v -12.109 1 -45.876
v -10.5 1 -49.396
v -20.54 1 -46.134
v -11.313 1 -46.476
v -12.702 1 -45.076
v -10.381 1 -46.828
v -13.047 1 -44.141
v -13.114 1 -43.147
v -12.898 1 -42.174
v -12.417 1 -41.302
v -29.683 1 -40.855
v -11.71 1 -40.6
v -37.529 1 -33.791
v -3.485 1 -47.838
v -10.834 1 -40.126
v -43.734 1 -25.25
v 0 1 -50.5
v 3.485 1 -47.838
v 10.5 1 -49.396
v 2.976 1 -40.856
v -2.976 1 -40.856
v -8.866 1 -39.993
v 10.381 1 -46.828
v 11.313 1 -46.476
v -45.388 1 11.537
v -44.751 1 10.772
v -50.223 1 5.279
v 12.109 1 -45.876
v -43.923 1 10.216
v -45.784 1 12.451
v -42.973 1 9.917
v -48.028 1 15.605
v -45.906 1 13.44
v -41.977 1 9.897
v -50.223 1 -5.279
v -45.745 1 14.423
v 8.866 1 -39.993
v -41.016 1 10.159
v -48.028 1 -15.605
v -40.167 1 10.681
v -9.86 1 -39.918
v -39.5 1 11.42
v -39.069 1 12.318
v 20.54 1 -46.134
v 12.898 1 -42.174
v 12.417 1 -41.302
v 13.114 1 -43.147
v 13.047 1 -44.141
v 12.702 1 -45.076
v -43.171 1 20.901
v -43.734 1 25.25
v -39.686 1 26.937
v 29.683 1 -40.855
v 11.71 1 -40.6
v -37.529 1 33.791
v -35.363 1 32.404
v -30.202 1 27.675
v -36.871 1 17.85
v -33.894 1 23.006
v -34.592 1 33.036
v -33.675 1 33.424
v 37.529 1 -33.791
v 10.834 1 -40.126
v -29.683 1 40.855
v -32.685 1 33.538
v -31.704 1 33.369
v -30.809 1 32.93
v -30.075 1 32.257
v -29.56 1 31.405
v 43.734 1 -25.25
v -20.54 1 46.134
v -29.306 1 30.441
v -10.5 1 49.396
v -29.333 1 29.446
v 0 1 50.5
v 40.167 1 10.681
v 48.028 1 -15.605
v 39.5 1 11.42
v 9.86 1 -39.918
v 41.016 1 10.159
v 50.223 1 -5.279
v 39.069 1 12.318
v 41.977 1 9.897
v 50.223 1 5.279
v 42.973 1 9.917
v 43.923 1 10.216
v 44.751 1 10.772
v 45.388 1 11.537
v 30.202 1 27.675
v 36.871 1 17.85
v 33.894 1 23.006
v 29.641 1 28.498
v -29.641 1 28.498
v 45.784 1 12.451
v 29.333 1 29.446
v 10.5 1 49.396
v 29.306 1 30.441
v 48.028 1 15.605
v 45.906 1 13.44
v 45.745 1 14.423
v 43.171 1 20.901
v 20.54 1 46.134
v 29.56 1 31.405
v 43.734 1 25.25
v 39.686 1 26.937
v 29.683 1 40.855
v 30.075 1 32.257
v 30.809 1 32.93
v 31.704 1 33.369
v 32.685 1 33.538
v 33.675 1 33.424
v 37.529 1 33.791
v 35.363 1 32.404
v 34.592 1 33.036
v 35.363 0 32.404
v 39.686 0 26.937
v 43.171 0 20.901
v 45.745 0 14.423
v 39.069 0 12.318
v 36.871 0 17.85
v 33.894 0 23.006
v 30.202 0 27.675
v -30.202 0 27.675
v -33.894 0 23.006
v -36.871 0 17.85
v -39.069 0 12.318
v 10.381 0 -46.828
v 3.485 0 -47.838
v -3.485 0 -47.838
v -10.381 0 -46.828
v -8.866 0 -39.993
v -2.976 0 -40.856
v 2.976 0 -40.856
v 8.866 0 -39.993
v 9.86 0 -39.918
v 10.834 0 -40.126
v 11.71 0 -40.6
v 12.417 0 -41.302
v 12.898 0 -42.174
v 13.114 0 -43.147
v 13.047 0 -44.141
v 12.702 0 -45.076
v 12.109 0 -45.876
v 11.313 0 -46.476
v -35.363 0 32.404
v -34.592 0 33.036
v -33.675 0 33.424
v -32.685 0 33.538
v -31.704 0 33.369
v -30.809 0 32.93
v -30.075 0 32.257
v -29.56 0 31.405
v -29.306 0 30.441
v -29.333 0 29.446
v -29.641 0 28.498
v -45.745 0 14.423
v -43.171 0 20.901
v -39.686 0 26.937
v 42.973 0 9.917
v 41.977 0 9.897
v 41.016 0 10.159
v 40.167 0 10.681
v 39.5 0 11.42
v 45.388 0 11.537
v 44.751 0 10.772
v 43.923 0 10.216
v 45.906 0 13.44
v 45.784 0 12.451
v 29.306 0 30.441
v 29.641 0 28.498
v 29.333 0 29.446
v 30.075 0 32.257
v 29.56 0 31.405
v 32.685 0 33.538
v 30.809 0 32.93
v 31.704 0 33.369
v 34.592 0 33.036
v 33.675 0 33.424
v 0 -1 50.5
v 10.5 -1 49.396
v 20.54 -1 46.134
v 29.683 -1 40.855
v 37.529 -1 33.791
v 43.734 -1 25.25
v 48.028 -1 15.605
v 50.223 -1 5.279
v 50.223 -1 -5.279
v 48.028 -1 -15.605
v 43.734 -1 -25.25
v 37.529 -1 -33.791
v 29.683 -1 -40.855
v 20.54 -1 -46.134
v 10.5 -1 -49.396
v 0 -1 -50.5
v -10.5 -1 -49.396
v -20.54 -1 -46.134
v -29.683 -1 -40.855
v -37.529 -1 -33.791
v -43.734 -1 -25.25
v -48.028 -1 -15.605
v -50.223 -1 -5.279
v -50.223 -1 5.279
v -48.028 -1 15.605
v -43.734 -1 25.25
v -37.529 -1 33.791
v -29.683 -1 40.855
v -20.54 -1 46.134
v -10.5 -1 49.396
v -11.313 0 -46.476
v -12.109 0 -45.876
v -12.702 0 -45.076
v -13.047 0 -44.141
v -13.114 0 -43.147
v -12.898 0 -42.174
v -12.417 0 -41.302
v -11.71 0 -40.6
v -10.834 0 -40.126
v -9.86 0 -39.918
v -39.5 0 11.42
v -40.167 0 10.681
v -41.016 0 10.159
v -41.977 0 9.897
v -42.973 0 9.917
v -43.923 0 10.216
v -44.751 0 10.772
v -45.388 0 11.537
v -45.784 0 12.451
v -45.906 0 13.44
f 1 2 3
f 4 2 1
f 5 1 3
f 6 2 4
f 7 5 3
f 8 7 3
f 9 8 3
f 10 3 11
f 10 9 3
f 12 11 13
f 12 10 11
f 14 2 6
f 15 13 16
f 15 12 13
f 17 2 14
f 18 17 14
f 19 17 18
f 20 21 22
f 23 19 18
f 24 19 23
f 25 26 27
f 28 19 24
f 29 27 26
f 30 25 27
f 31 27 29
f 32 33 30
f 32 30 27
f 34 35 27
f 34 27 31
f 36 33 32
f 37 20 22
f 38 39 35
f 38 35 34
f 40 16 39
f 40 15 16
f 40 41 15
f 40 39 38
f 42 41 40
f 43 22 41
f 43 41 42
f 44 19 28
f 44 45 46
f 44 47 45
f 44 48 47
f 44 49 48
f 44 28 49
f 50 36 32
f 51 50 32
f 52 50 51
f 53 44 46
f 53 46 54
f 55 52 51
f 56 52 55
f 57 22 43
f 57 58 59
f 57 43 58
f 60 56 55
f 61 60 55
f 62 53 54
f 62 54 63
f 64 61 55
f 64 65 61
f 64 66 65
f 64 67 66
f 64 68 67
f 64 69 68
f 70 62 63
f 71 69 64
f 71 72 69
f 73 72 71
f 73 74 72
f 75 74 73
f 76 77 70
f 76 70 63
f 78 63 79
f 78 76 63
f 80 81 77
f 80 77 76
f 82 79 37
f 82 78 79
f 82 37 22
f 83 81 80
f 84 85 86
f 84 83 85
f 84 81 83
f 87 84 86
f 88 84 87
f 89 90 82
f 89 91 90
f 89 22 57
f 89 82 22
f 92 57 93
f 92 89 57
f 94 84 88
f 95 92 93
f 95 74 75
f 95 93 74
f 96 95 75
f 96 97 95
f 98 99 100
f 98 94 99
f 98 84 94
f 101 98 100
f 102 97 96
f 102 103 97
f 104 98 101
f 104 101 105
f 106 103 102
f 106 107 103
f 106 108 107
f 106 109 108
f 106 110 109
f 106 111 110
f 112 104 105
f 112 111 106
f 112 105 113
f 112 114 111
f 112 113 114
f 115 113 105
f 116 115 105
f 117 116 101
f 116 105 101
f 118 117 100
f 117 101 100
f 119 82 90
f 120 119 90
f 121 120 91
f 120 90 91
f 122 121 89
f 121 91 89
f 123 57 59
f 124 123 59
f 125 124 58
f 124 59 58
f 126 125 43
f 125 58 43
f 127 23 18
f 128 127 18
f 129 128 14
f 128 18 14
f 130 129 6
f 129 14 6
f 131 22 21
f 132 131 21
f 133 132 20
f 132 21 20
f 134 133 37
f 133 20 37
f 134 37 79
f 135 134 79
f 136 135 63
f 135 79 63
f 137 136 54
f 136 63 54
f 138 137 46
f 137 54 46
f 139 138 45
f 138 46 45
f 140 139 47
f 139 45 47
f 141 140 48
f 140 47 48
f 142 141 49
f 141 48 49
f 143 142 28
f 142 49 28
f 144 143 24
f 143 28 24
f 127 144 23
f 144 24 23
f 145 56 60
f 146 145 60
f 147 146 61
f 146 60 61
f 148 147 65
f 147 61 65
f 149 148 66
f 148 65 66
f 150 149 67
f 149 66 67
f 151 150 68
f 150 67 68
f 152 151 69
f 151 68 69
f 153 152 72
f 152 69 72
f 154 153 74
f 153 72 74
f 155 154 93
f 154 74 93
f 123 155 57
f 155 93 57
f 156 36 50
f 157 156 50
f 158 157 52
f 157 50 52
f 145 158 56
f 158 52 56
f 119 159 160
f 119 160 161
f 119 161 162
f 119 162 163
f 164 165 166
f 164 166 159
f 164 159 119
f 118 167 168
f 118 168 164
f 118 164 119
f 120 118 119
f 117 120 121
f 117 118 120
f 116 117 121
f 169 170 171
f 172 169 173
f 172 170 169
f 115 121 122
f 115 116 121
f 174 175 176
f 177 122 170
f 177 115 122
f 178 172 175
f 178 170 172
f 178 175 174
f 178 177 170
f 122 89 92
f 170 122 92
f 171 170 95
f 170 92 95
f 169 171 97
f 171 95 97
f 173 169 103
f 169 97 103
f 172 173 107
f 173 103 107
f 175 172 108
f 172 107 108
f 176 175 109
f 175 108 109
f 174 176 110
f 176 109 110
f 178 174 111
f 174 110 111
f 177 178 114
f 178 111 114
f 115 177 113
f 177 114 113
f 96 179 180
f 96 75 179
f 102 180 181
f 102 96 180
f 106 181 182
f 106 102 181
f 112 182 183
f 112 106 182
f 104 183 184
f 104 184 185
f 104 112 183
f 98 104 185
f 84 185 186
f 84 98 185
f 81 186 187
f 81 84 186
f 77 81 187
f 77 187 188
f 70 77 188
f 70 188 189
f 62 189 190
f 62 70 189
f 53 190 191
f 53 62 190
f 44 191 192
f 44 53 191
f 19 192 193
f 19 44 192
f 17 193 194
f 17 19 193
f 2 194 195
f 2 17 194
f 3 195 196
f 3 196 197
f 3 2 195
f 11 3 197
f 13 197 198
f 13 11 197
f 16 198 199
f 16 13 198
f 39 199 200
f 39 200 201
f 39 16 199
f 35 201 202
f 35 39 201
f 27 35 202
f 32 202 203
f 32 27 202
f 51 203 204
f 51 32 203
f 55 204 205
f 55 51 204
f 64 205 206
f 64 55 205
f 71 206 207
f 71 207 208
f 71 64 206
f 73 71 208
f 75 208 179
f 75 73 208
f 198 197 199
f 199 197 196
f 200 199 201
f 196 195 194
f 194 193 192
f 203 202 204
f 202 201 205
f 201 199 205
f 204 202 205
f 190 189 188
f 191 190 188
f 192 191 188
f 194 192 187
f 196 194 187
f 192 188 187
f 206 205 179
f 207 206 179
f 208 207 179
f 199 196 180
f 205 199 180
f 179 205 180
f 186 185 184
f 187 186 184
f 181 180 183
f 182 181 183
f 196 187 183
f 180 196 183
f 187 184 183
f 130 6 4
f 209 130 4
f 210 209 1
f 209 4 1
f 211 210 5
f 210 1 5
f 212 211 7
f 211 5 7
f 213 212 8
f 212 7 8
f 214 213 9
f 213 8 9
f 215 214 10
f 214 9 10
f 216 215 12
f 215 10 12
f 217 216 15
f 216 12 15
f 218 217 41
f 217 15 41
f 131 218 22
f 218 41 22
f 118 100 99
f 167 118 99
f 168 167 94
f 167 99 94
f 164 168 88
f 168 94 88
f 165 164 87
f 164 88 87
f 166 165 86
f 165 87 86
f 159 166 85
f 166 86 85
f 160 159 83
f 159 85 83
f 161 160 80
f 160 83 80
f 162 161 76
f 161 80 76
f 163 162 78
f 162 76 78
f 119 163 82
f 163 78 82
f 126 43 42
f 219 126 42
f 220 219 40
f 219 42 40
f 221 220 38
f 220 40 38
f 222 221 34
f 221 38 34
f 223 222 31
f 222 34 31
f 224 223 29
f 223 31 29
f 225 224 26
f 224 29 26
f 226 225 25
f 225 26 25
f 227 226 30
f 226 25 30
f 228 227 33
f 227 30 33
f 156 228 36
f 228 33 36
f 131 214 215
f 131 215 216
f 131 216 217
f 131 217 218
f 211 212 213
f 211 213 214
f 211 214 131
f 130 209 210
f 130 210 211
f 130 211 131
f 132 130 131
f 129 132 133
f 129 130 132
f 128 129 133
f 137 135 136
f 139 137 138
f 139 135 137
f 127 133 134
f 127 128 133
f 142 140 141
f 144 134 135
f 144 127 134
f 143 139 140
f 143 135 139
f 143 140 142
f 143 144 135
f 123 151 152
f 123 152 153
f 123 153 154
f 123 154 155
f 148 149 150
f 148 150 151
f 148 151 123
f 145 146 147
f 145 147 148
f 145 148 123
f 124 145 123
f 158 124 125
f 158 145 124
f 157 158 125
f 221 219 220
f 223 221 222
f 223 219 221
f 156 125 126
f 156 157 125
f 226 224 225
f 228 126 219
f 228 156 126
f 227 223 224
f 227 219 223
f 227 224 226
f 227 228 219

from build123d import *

# Parameters (mm, degrees)
SKETCH1_R           = 50.5
BOSS_EXTRUDE1_DEPTH = 1
CUT_EXTRUDE1_DEPTH  = 1
CIRPATTERN1_COUNT   = 3


with BuildPart() as part:
    # Sketch1 → Boss-Extrude1 (new, symmetric)
    with BuildSketch(Plane(origin=(0, 0, 0), x_dir=(1, 0, 0), z_dir=(0, 1, 0))):
        with Locations(Location((0, 0, 0), (0, 0, 270))):
            Circle(SKETCH1_R)
    extrude(amount=BOSS_EXTRUDE1_DEPTH, both=True)

    # Sketch2 → Cut-Extrude1 (cut)
    with BuildSketch(Plane(origin=(0, 1, 0), x_dir=(1, 0, 0), z_dir=(0, 1, 0))):
        with BuildLine():
            ThreePointArc((10.381410523, 46.827516727), (0, 47.96446609), (-10.381410523, 46.827516727))
            ThreePointArc((-10.381410523, 46.827516727), (-13.040907899, 42.652942054), (-8.866333226, 39.993444677))
            ThreePointArc((-8.866333226, 39.993444677), (0, 40.96446609), (8.866333226, 39.993444677))
            ThreePointArc((8.866333226, 39.993444677), (13.040907899, 42.652942054), (10.381410523, 46.827516727))
        make_face()
    cut_extrude1 = extrude(amount=-CUT_EXTRUDE1_DEPTH, mode=Mode.SUBTRACT)

    # CirPattern1: Cut-Extrude1 ×3 about axis
    cirpattern1_axis = Axis((0, 0, 0), (0, 1, 0))
    for i in range(1, CIRPATTERN1_COUNT):
        add(cut_extrude1.rotate(cirpattern1_axis, i * 360 / CIRPATTERN1_COUNT), mode=Mode.SUBTRACT)


solid = part.part
